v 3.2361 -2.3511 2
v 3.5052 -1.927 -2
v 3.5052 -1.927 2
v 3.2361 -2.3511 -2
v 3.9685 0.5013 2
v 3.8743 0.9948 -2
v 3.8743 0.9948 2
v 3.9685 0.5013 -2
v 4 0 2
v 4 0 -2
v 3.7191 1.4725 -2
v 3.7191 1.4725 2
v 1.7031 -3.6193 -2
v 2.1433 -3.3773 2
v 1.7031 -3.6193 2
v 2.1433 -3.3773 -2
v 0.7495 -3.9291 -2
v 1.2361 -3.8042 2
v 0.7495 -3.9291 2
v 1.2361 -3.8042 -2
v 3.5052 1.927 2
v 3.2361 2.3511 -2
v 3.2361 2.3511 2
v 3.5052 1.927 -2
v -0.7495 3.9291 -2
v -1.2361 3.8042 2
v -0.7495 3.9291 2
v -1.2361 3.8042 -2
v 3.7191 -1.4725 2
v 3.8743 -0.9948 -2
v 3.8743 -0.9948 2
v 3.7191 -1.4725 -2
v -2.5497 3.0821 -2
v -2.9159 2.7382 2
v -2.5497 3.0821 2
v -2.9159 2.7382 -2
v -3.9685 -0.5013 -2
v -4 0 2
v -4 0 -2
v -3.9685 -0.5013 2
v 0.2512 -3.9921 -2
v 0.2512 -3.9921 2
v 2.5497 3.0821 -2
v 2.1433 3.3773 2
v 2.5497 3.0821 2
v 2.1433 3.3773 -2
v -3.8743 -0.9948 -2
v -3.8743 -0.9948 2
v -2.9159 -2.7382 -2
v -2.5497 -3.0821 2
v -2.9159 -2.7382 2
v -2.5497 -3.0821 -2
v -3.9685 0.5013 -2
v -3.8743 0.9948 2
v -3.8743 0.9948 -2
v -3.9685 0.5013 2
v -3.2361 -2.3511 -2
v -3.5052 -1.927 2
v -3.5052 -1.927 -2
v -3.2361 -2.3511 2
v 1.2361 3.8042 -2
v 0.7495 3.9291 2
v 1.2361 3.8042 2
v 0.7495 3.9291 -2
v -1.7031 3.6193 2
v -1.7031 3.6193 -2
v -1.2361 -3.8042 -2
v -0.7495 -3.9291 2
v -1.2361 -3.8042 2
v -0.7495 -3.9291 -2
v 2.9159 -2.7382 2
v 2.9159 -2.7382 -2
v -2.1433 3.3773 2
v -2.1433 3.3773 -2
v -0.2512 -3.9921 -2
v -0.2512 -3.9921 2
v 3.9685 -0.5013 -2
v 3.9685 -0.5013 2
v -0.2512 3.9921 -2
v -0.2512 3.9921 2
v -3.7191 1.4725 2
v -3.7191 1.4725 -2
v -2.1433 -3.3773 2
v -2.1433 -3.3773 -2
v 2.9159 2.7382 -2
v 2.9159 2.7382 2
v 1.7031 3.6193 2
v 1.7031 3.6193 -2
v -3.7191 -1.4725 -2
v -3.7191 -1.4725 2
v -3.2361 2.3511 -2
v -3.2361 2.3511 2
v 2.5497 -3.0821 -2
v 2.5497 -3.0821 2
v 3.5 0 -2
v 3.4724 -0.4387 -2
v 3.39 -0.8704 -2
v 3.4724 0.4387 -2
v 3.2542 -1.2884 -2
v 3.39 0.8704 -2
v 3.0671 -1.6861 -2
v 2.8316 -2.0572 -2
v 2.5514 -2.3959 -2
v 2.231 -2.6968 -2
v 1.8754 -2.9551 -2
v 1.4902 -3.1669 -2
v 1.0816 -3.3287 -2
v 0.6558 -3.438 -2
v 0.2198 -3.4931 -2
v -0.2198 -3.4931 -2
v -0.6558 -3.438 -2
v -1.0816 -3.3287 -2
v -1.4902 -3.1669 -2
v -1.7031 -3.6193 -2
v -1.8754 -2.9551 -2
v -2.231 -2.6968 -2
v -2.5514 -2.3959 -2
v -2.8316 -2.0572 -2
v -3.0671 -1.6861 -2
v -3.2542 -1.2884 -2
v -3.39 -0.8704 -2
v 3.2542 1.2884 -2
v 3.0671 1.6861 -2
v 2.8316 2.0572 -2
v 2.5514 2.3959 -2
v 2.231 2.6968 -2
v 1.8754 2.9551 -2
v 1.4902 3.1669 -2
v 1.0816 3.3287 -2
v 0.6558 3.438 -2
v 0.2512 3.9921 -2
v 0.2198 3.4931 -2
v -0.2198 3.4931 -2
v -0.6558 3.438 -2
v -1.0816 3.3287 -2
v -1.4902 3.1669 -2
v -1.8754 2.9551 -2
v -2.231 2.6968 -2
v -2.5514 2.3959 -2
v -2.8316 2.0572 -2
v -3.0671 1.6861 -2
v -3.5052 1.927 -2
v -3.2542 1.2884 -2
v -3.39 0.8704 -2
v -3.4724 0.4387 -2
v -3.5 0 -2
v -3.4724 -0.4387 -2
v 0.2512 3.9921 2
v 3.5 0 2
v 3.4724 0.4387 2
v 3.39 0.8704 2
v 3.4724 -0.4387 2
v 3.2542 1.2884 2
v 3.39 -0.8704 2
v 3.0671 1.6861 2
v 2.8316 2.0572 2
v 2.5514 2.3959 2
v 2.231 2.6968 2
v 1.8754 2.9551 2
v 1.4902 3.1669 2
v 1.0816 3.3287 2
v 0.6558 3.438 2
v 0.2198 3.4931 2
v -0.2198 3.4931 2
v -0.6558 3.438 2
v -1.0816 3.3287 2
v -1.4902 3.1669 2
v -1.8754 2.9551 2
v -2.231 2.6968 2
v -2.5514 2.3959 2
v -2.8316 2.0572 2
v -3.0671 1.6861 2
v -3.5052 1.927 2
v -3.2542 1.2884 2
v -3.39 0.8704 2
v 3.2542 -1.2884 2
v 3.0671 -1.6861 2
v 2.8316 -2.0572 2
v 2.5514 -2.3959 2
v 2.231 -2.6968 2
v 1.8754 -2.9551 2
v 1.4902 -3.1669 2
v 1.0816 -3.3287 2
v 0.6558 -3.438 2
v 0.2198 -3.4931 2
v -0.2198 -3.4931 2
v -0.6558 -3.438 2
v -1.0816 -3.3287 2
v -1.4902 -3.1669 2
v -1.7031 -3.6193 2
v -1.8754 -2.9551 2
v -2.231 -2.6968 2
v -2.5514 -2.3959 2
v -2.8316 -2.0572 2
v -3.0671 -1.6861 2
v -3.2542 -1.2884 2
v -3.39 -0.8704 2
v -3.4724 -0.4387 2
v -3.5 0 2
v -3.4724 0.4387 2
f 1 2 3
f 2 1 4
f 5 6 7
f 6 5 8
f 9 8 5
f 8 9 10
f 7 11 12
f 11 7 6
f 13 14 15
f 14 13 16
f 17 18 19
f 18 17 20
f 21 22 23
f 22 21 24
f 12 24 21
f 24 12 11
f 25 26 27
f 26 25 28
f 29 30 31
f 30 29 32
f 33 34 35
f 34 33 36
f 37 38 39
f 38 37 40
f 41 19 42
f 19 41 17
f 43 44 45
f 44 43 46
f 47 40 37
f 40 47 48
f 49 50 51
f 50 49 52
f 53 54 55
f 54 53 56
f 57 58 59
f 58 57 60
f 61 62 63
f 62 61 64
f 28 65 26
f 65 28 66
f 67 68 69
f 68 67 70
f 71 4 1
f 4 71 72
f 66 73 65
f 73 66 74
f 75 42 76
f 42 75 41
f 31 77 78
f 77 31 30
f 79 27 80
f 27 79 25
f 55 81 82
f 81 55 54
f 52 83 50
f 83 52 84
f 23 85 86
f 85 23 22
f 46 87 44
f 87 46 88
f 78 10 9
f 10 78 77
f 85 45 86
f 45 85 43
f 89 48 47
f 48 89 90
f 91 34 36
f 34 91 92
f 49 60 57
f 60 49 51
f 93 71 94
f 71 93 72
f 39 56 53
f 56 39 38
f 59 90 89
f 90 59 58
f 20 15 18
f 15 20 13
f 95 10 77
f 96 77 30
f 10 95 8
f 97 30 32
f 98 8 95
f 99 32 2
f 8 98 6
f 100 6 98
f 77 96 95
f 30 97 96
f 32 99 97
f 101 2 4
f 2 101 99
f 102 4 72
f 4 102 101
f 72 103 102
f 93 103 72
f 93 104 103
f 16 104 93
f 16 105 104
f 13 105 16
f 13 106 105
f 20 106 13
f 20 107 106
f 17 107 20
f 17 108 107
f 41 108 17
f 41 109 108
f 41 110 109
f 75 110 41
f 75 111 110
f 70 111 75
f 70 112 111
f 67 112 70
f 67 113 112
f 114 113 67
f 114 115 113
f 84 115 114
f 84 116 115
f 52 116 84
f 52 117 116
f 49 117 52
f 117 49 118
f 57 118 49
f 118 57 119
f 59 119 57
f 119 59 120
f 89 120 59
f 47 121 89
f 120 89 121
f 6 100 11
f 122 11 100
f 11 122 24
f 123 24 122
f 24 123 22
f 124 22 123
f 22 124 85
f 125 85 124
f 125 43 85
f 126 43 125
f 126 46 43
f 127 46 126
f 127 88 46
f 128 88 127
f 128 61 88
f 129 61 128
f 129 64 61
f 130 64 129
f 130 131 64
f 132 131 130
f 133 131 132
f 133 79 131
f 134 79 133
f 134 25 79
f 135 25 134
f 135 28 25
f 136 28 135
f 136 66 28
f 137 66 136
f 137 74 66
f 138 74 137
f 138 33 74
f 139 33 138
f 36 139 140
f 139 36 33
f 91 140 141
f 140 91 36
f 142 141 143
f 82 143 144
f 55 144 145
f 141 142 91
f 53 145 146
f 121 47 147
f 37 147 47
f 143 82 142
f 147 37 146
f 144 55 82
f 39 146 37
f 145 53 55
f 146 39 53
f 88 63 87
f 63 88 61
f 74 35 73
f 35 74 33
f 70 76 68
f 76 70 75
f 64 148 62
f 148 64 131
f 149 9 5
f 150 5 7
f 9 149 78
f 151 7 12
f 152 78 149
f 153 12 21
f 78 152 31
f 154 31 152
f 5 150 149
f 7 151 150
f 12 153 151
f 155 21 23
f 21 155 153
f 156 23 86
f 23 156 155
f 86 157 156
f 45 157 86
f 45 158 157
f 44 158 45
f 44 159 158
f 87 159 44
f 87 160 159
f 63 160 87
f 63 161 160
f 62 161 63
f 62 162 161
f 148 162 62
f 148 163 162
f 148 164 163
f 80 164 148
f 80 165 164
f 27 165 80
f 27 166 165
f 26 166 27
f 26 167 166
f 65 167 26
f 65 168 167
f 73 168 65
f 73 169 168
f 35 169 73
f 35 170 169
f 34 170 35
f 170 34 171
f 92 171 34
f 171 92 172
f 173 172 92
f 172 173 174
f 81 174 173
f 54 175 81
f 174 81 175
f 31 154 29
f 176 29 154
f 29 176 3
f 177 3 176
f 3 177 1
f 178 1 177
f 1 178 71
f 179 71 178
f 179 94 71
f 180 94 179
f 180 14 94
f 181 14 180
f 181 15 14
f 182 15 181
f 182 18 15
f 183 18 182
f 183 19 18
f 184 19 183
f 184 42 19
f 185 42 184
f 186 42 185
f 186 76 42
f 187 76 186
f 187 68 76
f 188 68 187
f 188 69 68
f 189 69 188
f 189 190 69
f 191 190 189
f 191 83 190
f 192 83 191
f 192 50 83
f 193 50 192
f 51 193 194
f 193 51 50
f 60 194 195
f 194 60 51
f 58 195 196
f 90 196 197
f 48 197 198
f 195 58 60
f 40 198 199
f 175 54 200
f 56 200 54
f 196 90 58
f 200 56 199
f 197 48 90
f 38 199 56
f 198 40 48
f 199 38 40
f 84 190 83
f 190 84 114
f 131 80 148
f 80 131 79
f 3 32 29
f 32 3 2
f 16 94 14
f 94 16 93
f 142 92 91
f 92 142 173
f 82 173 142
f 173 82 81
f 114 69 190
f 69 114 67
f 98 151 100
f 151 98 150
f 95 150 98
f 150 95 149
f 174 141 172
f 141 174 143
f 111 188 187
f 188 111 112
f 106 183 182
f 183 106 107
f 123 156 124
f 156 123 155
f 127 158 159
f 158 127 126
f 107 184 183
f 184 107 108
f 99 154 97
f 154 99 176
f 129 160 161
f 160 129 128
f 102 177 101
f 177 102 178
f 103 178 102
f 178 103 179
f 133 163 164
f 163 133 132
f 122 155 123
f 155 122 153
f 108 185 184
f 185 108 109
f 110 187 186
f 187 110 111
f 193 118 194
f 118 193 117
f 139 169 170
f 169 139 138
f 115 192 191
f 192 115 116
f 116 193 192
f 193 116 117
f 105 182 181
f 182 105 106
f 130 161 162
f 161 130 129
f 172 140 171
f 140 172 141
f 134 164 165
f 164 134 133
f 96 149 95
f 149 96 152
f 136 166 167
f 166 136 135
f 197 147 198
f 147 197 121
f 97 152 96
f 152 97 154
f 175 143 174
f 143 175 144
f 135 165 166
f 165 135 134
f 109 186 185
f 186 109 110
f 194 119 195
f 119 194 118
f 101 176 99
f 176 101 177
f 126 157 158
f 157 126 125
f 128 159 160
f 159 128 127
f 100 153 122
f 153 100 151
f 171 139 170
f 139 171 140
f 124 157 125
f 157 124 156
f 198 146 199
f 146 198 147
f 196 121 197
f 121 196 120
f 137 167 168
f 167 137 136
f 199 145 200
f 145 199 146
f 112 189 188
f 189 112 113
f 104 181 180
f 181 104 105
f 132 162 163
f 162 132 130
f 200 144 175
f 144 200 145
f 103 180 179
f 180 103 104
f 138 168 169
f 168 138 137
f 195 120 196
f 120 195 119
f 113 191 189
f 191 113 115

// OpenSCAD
$fn = 50;


difference() {
	union() {
		translate(v = [0, 0, -2.0000000000]) {
			cylinder(h = 4, r = 4.0000000000);
		}
	}
	union() {
		translate(v = [0, 0, -100.0000000000]) {
			cylinder(h = 200, r = 3.5000000000);
		}
	}
}
